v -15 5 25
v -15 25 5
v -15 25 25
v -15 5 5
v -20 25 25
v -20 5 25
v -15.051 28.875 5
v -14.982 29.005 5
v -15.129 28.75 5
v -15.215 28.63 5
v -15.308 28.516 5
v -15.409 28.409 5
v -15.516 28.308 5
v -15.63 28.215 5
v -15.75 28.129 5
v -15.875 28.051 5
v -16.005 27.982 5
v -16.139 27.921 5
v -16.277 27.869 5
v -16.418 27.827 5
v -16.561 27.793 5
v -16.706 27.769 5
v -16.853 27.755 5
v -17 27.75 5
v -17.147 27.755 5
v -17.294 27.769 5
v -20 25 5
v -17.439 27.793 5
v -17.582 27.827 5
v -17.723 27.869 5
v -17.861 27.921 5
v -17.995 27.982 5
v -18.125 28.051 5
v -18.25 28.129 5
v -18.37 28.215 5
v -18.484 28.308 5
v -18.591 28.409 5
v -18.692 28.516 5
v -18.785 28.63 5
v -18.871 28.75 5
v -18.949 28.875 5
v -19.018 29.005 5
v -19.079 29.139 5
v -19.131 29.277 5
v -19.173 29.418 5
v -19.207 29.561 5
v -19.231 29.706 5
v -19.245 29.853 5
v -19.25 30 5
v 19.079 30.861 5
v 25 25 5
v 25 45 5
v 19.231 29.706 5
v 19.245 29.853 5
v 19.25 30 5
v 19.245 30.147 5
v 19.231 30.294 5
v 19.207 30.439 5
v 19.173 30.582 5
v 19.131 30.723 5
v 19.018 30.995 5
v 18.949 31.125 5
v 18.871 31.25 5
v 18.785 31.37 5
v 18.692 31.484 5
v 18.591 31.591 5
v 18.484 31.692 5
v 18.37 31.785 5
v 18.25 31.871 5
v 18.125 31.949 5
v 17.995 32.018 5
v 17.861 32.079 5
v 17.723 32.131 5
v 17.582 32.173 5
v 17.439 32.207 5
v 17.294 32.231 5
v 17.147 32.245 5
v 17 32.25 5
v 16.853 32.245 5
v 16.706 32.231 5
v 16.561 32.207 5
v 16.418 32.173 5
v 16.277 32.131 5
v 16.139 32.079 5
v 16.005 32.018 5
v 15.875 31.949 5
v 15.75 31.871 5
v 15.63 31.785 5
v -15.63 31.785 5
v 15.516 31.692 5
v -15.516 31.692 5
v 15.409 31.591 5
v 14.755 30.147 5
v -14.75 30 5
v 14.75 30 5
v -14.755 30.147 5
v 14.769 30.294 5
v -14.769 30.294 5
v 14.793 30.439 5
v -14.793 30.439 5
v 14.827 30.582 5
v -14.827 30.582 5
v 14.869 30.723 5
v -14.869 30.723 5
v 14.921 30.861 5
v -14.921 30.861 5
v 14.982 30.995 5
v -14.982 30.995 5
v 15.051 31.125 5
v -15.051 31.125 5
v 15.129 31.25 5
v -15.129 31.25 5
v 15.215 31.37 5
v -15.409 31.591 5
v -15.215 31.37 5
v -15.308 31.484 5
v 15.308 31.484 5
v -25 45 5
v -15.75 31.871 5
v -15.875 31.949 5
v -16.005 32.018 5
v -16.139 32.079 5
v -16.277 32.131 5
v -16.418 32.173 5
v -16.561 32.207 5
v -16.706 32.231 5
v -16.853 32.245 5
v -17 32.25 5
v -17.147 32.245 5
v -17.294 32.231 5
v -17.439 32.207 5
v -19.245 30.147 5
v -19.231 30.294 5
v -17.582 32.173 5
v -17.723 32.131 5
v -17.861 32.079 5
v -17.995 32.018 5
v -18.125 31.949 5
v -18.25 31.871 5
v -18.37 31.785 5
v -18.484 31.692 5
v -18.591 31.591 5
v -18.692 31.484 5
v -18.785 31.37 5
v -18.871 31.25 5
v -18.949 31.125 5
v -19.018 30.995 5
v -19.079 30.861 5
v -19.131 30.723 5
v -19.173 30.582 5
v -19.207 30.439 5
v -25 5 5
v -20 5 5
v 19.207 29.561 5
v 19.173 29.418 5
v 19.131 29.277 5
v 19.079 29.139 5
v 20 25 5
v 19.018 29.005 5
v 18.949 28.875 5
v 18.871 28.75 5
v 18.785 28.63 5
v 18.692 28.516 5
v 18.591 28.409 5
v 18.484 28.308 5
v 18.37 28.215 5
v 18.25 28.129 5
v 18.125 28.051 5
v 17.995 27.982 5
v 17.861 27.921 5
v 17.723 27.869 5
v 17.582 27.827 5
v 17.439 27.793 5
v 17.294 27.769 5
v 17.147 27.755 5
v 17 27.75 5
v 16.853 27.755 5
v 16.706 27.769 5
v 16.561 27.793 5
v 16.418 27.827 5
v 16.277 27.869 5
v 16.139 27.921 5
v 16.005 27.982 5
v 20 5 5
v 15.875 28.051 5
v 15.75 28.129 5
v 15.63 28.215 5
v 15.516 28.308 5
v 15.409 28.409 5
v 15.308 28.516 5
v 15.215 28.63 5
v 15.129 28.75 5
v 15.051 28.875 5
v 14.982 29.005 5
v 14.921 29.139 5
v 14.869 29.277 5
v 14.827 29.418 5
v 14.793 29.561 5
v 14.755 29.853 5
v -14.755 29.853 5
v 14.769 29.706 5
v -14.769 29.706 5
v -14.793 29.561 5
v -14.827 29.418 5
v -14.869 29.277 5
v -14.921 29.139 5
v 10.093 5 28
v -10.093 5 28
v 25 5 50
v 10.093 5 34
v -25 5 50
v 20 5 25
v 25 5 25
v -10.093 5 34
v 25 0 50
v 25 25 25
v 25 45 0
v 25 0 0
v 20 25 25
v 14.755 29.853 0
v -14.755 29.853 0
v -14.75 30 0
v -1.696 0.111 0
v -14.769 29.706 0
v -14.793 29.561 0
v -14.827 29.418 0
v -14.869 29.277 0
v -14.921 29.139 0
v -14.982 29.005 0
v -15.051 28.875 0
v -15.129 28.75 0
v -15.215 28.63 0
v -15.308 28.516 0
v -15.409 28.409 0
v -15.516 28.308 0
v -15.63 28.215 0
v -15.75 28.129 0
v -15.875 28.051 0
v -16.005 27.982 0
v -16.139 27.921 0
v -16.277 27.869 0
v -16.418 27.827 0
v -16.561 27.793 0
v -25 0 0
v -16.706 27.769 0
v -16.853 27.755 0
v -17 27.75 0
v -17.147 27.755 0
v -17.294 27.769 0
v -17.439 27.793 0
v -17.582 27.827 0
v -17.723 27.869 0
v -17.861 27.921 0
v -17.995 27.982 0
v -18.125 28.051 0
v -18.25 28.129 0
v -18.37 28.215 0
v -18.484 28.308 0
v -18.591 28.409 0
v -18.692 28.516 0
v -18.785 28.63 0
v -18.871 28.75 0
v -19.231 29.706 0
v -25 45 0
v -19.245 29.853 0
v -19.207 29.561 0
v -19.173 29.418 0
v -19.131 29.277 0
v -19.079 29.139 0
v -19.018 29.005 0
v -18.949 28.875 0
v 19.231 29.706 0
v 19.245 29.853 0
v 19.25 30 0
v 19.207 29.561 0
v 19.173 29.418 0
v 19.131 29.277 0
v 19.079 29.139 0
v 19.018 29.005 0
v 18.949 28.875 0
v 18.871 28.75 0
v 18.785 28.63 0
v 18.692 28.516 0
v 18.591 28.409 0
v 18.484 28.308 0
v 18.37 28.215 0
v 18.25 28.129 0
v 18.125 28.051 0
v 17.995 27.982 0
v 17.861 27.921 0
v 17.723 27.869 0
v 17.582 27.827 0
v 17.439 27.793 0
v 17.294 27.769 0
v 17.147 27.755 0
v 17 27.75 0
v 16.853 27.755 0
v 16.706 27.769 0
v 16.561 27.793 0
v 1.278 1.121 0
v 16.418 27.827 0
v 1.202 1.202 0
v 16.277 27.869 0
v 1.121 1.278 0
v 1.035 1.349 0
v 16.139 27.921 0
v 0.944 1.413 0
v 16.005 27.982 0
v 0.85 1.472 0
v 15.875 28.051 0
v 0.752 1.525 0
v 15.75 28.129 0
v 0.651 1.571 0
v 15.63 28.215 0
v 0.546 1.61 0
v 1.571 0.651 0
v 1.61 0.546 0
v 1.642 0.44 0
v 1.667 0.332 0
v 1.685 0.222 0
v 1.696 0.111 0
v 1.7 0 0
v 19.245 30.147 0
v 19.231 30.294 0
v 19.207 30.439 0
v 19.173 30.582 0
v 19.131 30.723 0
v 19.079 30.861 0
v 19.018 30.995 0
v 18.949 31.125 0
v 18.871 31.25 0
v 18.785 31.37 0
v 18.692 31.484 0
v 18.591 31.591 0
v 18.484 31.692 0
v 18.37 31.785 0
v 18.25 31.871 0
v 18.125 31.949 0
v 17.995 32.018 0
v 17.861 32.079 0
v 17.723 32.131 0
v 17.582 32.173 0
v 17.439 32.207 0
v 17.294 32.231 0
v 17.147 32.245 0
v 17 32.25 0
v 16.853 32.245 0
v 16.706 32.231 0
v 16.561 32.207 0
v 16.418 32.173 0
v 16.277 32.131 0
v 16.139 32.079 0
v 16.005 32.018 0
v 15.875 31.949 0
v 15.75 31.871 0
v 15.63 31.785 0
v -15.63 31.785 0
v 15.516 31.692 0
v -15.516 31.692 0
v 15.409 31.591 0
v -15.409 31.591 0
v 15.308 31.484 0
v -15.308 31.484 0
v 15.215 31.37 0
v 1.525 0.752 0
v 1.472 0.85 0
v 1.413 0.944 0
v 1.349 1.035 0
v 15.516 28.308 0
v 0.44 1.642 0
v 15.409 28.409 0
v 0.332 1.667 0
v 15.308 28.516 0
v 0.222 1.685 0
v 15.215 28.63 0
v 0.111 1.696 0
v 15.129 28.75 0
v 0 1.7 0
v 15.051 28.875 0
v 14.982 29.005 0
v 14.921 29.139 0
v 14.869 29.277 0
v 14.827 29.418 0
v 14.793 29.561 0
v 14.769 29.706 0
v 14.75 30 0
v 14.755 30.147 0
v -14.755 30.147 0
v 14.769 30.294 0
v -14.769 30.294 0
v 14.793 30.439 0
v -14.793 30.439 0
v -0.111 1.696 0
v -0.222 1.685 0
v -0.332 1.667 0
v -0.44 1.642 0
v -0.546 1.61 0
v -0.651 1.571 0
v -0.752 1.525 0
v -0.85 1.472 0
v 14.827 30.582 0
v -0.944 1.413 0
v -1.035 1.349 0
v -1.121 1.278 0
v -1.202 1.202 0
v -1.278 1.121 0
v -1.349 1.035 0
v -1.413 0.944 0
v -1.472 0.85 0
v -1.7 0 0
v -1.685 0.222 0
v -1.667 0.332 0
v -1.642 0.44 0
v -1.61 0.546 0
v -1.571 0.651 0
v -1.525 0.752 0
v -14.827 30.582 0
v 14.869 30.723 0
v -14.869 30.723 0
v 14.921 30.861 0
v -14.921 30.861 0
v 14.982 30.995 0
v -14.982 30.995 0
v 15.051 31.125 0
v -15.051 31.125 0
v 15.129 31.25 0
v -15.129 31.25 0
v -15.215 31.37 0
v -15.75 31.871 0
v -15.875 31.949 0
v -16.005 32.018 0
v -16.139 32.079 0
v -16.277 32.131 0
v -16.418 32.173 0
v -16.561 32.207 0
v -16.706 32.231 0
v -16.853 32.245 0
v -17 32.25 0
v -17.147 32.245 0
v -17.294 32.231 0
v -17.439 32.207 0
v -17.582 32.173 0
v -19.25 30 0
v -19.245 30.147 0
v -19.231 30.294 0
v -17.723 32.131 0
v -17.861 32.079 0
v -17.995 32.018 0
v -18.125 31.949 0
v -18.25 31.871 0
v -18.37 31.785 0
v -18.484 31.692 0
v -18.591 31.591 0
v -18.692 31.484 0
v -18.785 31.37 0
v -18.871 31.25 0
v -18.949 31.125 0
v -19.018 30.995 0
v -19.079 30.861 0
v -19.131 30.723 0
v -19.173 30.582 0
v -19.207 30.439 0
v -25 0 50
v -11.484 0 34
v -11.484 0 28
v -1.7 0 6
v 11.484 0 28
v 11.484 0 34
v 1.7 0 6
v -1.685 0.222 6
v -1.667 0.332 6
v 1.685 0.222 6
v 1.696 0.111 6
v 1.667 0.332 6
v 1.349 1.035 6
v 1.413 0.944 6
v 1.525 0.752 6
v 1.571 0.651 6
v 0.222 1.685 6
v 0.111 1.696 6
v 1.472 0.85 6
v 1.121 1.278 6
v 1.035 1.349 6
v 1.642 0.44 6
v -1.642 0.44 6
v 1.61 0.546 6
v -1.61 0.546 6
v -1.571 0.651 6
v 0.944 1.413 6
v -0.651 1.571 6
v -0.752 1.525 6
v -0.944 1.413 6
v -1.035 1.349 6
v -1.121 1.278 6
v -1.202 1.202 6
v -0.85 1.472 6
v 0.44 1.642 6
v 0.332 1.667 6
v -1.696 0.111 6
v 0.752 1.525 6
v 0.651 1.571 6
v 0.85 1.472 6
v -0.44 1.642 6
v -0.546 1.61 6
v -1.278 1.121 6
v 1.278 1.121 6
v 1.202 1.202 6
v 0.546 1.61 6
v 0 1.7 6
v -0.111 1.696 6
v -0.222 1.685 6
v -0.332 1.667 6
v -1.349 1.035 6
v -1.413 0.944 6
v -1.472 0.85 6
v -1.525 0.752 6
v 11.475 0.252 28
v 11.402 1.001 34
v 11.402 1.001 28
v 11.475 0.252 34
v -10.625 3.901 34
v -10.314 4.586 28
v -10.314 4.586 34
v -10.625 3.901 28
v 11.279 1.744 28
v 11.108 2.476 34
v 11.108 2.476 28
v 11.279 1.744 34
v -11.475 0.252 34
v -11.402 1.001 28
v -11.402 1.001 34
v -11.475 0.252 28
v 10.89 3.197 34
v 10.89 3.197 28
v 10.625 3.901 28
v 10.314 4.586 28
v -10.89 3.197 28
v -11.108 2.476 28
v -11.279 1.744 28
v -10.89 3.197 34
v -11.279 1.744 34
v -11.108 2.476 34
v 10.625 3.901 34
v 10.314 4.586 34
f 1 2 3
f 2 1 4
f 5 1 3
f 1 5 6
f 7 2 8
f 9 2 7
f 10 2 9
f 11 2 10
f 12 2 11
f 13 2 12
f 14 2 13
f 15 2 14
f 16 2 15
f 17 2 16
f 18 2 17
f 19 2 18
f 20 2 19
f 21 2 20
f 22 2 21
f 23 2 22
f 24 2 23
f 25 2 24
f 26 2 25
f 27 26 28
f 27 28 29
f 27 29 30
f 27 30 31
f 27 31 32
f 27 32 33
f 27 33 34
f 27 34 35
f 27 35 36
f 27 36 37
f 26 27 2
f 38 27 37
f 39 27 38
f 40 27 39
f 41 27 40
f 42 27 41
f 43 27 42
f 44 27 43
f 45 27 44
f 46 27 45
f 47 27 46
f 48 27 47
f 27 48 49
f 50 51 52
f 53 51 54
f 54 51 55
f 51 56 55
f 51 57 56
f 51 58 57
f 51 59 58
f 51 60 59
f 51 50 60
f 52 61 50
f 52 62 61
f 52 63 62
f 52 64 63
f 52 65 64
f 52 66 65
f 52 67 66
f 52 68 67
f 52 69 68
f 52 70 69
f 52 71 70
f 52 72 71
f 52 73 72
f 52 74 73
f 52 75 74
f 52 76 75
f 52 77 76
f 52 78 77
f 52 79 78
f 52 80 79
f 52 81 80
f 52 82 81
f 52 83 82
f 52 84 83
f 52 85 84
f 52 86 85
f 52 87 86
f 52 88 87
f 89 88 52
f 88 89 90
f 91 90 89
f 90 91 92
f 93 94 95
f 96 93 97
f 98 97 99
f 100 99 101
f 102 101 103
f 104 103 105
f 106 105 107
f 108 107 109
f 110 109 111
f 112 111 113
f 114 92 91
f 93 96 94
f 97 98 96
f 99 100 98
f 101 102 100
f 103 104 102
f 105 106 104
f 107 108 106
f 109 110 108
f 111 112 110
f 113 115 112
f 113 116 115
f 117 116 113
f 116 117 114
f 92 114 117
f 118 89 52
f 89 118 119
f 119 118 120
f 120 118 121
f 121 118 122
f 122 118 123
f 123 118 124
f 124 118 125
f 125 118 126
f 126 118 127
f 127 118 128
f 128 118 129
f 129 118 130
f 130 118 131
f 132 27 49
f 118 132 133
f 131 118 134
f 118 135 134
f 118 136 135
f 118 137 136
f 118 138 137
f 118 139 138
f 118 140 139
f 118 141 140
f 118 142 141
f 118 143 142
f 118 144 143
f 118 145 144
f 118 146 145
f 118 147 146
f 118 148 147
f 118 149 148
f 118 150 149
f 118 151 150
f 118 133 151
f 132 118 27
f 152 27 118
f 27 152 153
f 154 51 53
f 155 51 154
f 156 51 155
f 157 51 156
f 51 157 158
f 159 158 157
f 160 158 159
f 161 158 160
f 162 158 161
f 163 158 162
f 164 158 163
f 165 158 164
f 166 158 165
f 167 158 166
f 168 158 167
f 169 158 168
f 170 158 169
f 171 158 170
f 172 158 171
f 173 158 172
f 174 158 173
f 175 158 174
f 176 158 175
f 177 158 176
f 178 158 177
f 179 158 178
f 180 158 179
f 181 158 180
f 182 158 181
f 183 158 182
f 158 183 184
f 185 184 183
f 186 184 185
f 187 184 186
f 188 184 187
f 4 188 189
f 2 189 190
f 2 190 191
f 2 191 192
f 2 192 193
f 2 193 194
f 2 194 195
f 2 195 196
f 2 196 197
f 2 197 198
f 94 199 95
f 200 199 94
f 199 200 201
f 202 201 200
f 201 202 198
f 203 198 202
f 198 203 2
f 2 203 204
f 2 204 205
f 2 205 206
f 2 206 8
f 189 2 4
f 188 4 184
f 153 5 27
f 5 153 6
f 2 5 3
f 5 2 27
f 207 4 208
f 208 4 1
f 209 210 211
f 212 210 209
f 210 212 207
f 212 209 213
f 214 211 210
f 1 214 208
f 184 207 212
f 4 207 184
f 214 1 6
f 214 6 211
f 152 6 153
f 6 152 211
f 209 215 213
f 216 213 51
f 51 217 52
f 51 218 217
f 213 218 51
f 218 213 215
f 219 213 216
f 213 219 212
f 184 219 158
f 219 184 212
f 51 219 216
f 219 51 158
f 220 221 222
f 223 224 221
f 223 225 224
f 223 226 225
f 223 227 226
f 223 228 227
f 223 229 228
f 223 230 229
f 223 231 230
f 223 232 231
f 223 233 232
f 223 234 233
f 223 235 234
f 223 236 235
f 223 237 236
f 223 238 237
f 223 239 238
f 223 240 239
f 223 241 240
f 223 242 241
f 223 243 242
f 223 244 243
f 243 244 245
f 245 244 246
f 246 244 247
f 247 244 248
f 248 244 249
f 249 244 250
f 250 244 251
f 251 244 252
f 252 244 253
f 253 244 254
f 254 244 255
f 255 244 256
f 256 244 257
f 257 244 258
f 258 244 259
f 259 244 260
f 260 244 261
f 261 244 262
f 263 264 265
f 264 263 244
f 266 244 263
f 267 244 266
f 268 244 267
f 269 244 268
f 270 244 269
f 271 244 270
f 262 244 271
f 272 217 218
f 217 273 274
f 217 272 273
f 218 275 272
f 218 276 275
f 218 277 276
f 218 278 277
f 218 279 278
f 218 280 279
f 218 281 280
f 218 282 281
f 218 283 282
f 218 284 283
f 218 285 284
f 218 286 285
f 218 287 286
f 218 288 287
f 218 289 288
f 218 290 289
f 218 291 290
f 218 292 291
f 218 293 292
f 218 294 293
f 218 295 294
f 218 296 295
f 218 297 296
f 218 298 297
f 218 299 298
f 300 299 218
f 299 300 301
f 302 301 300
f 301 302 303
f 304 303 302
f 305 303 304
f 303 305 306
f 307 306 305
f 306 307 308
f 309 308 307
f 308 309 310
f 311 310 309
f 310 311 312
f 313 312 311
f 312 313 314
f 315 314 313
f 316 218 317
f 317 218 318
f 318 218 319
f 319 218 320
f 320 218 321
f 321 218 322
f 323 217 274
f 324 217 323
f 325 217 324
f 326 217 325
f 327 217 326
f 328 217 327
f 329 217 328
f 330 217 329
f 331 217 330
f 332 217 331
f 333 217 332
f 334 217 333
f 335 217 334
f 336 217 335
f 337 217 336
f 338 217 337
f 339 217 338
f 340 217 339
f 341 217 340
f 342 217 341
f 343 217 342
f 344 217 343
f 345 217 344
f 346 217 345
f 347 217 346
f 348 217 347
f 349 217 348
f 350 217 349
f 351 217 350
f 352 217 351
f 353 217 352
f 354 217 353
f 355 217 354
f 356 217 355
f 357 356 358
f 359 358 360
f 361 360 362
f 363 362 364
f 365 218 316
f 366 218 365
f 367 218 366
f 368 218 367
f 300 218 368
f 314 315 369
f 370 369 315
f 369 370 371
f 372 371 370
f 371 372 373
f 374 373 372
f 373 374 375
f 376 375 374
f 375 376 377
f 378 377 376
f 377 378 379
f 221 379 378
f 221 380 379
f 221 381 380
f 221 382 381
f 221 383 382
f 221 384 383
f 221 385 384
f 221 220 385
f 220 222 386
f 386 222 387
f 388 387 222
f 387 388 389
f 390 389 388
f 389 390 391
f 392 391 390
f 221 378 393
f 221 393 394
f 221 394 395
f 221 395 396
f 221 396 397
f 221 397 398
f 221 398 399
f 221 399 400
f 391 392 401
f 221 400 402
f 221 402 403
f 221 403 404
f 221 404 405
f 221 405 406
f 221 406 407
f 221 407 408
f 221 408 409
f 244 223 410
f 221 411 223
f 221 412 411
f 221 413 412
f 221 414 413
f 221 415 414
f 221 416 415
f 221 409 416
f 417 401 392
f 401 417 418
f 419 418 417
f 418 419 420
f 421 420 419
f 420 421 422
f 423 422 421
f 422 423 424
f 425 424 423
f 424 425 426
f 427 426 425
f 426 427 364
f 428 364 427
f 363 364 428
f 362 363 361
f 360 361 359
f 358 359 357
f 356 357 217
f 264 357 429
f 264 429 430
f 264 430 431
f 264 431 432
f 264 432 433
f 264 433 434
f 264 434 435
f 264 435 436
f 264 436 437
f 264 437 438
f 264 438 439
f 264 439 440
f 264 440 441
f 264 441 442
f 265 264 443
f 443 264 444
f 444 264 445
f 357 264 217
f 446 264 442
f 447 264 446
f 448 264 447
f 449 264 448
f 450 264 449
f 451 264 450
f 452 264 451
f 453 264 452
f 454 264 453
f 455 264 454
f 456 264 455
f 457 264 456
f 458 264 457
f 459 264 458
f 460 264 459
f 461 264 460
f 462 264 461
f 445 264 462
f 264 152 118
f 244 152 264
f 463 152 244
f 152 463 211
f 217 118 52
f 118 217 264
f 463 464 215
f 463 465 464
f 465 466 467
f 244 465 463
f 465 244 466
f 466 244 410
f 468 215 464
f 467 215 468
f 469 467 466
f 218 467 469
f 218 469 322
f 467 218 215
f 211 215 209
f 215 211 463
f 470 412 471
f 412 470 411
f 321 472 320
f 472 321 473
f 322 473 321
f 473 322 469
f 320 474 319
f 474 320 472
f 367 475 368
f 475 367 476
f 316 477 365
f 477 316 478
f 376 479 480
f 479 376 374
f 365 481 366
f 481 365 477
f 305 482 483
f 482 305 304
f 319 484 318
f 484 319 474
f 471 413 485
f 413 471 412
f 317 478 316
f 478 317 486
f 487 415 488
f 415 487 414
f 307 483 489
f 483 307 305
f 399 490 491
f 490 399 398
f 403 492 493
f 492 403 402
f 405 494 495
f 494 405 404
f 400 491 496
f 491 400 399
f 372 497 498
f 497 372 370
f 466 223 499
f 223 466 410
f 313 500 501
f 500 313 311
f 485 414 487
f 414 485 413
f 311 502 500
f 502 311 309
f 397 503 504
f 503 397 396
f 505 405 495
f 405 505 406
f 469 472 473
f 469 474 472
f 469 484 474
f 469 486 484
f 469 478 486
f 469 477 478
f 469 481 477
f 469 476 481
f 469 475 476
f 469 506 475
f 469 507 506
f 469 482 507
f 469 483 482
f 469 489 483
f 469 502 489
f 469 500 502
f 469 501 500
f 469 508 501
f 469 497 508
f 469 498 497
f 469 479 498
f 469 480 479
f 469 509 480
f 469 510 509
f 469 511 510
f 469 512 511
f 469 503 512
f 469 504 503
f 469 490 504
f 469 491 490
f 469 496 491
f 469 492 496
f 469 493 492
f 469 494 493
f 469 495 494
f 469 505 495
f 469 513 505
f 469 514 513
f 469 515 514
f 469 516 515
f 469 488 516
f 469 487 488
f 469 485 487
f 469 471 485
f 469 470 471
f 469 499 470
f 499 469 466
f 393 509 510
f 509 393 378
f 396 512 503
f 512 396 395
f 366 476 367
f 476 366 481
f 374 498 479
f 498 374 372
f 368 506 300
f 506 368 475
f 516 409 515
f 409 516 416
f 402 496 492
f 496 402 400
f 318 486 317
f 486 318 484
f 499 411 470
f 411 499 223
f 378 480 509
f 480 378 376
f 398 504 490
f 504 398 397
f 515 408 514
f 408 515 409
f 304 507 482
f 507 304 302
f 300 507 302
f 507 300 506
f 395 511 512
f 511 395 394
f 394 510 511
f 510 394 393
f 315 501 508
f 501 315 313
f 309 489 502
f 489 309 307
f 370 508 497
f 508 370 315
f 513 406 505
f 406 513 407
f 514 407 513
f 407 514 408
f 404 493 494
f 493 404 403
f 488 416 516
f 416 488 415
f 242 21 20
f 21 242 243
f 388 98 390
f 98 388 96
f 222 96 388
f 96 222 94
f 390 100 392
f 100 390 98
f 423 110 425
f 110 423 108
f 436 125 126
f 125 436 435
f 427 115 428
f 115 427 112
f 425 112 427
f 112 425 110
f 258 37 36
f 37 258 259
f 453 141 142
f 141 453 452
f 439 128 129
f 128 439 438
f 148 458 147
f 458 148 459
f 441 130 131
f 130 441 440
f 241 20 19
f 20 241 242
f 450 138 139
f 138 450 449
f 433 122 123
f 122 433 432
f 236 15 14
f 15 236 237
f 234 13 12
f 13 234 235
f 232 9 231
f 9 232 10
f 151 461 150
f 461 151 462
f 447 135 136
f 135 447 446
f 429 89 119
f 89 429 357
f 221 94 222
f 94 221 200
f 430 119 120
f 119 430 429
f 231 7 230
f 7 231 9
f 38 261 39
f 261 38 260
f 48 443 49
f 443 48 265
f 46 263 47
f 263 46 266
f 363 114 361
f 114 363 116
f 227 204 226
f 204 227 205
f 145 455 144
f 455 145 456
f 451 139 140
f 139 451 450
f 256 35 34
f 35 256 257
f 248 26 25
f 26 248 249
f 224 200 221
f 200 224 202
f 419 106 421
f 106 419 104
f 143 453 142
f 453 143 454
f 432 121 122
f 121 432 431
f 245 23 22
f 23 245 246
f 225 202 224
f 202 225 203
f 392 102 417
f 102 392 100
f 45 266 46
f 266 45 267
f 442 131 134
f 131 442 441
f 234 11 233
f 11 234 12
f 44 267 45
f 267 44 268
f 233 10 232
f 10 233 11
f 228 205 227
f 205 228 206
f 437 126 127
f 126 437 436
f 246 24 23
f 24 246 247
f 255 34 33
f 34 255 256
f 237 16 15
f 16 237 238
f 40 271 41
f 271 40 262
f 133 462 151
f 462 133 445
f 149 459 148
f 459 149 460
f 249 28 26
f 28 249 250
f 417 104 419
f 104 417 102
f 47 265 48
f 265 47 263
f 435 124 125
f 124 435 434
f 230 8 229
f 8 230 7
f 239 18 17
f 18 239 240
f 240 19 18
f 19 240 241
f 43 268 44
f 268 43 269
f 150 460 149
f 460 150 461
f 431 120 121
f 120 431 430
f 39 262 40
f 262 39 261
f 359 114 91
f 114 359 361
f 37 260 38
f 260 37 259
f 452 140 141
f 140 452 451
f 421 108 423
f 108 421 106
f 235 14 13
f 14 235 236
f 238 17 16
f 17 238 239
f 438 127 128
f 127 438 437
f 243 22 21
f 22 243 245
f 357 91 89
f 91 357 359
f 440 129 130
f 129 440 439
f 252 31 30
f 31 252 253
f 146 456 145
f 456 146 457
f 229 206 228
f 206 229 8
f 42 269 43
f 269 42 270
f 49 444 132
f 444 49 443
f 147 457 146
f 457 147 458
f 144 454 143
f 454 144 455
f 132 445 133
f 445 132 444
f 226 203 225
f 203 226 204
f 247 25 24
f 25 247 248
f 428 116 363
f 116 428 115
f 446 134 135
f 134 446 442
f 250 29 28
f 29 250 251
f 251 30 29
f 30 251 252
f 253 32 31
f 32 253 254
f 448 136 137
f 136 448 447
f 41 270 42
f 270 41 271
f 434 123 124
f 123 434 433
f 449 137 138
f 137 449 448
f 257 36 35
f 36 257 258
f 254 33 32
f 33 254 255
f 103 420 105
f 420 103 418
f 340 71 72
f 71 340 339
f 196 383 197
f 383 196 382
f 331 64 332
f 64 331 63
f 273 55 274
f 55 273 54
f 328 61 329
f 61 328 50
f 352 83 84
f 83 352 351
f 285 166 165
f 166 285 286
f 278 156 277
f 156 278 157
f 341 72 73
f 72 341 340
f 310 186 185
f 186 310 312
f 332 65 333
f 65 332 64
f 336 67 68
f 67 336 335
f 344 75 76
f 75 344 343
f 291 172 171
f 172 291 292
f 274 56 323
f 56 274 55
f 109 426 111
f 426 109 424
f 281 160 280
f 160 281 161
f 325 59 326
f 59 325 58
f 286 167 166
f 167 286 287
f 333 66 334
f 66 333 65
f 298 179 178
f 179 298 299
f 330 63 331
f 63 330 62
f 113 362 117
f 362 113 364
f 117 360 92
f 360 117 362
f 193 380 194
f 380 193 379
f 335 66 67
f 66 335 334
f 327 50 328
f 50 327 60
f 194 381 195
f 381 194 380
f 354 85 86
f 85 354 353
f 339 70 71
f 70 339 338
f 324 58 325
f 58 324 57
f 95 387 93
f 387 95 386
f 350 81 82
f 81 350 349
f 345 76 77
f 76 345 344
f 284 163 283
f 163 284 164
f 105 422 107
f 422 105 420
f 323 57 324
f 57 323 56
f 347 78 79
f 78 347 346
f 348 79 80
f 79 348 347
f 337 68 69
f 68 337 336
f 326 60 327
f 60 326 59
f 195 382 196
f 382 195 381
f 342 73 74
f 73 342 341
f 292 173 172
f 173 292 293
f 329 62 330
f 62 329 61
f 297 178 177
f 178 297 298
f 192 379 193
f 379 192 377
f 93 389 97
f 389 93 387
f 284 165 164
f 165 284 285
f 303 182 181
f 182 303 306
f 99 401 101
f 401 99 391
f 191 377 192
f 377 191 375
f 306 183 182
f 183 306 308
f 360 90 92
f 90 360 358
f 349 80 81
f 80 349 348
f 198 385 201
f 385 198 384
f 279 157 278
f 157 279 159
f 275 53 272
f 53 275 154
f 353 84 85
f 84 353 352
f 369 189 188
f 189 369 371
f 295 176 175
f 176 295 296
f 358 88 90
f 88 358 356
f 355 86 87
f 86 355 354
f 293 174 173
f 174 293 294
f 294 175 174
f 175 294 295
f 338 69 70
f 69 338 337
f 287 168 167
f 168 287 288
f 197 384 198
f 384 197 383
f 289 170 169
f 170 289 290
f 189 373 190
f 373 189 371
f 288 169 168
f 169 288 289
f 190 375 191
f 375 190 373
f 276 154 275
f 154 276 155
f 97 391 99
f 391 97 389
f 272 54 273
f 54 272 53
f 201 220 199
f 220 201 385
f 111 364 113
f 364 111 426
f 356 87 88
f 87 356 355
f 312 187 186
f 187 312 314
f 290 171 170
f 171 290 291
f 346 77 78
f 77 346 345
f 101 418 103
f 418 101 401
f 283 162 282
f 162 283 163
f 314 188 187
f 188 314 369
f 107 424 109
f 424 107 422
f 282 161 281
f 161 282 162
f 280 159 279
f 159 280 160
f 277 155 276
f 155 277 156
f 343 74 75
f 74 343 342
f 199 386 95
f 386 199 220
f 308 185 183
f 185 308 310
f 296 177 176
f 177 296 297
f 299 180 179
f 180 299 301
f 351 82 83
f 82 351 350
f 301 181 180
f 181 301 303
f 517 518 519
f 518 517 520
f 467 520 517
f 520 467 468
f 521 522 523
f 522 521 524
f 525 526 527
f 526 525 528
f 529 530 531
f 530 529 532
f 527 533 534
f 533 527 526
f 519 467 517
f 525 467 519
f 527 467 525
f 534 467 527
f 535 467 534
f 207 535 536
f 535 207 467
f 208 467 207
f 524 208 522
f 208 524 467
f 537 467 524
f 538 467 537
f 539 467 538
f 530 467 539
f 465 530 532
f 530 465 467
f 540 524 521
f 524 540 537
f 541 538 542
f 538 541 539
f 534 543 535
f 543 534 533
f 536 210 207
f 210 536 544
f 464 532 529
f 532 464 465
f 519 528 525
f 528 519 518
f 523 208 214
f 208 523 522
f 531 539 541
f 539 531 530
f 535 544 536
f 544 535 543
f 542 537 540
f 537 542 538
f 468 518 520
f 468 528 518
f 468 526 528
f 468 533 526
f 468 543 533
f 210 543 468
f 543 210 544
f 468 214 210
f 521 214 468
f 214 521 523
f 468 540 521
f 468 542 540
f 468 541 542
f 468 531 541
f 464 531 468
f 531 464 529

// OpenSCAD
// L-shaped mounting bracket for NEMA 17 stepper motor (e.g. syringe pump)
// Print orientation: base plate on bed, vertical plate builds upward (+Z)

// ---------------- Parameters ----------------
base_x      = 25;     // base plate half-length in X (plate spans -25 to 25)
base_y      = 45;     // base plate length in Y (0 to 45)
base_z      = 5;      // base plate thickness

motor_h     = 50;     // vertical motor plate height (z = 0 to 50)
motor_t     = 5;      // vertical motor plate thickness in Y (0 to 5)

boss_d      = 23;     // motor centring boss hole diameter
boss_x      = 0;      // boss hole centre X
boss_z      = 28;     // boss hole centre Z

screw_d     = 3.4;    // M3 screw hole diameter
screw_n     = 4;      // number of screw holes
screw_a     = 31;     // square pattern side length (hole centre to hole centre)

gusset_t    = 5;      // gusset thickness in X
gusset_y    = 20;     // gusset leg along +Y (from y = 5)
gusset_z    = 20;     // gusset leg along +Z (from z = 5)

eps         = 0.5;    // cutter overshoot past faces
$fn         = 96;     // curve resolution

// ---------------- Model ----------------
difference() {
    union() {
        // Base plate
        translate([-base_x, 0, 0])
            cube([2 * base_x, base_y, base_z]);

        // Vertical motor plate
        translate([-base_x, 0, 0])
            cube([2 * base_x, motor_t, motor_h]);

        // Gussets: right-angle corner at (y = 5, z = 5), flush with left/right edges
        for (sx = [-1, 1])
            translate([sx * (base_x - gusset_t), 5, 5])
                cube([gusset_t, gusset_y, gusset_z]);
    }

    // Base plate M4 through-holes
    translate([-17, 30, -eps])
        cylinder(d = 4.5, h = base_z + 2 * eps);
    translate([17, 30, -eps])
        cylinder(d = 4.5, h = base_z + 2 * eps);

    // Motor plate boss hole (along Y) and M3 screw holes on 31 mm square pattern
    translate([boss_x, -eps, boss_z])
        cylinder(d = boss_d, h = motor_t + 2 * eps);
    for (i = [0 : screw_n - 1]) {
        angle = i * 90;
        translate([boss_x + screw_a / 2 * [cos(angle), sin(angle)],
                   -eps, boss_z])
            cylinder(d = screw_d, h = motor_t + 2 * eps);
    }
}
